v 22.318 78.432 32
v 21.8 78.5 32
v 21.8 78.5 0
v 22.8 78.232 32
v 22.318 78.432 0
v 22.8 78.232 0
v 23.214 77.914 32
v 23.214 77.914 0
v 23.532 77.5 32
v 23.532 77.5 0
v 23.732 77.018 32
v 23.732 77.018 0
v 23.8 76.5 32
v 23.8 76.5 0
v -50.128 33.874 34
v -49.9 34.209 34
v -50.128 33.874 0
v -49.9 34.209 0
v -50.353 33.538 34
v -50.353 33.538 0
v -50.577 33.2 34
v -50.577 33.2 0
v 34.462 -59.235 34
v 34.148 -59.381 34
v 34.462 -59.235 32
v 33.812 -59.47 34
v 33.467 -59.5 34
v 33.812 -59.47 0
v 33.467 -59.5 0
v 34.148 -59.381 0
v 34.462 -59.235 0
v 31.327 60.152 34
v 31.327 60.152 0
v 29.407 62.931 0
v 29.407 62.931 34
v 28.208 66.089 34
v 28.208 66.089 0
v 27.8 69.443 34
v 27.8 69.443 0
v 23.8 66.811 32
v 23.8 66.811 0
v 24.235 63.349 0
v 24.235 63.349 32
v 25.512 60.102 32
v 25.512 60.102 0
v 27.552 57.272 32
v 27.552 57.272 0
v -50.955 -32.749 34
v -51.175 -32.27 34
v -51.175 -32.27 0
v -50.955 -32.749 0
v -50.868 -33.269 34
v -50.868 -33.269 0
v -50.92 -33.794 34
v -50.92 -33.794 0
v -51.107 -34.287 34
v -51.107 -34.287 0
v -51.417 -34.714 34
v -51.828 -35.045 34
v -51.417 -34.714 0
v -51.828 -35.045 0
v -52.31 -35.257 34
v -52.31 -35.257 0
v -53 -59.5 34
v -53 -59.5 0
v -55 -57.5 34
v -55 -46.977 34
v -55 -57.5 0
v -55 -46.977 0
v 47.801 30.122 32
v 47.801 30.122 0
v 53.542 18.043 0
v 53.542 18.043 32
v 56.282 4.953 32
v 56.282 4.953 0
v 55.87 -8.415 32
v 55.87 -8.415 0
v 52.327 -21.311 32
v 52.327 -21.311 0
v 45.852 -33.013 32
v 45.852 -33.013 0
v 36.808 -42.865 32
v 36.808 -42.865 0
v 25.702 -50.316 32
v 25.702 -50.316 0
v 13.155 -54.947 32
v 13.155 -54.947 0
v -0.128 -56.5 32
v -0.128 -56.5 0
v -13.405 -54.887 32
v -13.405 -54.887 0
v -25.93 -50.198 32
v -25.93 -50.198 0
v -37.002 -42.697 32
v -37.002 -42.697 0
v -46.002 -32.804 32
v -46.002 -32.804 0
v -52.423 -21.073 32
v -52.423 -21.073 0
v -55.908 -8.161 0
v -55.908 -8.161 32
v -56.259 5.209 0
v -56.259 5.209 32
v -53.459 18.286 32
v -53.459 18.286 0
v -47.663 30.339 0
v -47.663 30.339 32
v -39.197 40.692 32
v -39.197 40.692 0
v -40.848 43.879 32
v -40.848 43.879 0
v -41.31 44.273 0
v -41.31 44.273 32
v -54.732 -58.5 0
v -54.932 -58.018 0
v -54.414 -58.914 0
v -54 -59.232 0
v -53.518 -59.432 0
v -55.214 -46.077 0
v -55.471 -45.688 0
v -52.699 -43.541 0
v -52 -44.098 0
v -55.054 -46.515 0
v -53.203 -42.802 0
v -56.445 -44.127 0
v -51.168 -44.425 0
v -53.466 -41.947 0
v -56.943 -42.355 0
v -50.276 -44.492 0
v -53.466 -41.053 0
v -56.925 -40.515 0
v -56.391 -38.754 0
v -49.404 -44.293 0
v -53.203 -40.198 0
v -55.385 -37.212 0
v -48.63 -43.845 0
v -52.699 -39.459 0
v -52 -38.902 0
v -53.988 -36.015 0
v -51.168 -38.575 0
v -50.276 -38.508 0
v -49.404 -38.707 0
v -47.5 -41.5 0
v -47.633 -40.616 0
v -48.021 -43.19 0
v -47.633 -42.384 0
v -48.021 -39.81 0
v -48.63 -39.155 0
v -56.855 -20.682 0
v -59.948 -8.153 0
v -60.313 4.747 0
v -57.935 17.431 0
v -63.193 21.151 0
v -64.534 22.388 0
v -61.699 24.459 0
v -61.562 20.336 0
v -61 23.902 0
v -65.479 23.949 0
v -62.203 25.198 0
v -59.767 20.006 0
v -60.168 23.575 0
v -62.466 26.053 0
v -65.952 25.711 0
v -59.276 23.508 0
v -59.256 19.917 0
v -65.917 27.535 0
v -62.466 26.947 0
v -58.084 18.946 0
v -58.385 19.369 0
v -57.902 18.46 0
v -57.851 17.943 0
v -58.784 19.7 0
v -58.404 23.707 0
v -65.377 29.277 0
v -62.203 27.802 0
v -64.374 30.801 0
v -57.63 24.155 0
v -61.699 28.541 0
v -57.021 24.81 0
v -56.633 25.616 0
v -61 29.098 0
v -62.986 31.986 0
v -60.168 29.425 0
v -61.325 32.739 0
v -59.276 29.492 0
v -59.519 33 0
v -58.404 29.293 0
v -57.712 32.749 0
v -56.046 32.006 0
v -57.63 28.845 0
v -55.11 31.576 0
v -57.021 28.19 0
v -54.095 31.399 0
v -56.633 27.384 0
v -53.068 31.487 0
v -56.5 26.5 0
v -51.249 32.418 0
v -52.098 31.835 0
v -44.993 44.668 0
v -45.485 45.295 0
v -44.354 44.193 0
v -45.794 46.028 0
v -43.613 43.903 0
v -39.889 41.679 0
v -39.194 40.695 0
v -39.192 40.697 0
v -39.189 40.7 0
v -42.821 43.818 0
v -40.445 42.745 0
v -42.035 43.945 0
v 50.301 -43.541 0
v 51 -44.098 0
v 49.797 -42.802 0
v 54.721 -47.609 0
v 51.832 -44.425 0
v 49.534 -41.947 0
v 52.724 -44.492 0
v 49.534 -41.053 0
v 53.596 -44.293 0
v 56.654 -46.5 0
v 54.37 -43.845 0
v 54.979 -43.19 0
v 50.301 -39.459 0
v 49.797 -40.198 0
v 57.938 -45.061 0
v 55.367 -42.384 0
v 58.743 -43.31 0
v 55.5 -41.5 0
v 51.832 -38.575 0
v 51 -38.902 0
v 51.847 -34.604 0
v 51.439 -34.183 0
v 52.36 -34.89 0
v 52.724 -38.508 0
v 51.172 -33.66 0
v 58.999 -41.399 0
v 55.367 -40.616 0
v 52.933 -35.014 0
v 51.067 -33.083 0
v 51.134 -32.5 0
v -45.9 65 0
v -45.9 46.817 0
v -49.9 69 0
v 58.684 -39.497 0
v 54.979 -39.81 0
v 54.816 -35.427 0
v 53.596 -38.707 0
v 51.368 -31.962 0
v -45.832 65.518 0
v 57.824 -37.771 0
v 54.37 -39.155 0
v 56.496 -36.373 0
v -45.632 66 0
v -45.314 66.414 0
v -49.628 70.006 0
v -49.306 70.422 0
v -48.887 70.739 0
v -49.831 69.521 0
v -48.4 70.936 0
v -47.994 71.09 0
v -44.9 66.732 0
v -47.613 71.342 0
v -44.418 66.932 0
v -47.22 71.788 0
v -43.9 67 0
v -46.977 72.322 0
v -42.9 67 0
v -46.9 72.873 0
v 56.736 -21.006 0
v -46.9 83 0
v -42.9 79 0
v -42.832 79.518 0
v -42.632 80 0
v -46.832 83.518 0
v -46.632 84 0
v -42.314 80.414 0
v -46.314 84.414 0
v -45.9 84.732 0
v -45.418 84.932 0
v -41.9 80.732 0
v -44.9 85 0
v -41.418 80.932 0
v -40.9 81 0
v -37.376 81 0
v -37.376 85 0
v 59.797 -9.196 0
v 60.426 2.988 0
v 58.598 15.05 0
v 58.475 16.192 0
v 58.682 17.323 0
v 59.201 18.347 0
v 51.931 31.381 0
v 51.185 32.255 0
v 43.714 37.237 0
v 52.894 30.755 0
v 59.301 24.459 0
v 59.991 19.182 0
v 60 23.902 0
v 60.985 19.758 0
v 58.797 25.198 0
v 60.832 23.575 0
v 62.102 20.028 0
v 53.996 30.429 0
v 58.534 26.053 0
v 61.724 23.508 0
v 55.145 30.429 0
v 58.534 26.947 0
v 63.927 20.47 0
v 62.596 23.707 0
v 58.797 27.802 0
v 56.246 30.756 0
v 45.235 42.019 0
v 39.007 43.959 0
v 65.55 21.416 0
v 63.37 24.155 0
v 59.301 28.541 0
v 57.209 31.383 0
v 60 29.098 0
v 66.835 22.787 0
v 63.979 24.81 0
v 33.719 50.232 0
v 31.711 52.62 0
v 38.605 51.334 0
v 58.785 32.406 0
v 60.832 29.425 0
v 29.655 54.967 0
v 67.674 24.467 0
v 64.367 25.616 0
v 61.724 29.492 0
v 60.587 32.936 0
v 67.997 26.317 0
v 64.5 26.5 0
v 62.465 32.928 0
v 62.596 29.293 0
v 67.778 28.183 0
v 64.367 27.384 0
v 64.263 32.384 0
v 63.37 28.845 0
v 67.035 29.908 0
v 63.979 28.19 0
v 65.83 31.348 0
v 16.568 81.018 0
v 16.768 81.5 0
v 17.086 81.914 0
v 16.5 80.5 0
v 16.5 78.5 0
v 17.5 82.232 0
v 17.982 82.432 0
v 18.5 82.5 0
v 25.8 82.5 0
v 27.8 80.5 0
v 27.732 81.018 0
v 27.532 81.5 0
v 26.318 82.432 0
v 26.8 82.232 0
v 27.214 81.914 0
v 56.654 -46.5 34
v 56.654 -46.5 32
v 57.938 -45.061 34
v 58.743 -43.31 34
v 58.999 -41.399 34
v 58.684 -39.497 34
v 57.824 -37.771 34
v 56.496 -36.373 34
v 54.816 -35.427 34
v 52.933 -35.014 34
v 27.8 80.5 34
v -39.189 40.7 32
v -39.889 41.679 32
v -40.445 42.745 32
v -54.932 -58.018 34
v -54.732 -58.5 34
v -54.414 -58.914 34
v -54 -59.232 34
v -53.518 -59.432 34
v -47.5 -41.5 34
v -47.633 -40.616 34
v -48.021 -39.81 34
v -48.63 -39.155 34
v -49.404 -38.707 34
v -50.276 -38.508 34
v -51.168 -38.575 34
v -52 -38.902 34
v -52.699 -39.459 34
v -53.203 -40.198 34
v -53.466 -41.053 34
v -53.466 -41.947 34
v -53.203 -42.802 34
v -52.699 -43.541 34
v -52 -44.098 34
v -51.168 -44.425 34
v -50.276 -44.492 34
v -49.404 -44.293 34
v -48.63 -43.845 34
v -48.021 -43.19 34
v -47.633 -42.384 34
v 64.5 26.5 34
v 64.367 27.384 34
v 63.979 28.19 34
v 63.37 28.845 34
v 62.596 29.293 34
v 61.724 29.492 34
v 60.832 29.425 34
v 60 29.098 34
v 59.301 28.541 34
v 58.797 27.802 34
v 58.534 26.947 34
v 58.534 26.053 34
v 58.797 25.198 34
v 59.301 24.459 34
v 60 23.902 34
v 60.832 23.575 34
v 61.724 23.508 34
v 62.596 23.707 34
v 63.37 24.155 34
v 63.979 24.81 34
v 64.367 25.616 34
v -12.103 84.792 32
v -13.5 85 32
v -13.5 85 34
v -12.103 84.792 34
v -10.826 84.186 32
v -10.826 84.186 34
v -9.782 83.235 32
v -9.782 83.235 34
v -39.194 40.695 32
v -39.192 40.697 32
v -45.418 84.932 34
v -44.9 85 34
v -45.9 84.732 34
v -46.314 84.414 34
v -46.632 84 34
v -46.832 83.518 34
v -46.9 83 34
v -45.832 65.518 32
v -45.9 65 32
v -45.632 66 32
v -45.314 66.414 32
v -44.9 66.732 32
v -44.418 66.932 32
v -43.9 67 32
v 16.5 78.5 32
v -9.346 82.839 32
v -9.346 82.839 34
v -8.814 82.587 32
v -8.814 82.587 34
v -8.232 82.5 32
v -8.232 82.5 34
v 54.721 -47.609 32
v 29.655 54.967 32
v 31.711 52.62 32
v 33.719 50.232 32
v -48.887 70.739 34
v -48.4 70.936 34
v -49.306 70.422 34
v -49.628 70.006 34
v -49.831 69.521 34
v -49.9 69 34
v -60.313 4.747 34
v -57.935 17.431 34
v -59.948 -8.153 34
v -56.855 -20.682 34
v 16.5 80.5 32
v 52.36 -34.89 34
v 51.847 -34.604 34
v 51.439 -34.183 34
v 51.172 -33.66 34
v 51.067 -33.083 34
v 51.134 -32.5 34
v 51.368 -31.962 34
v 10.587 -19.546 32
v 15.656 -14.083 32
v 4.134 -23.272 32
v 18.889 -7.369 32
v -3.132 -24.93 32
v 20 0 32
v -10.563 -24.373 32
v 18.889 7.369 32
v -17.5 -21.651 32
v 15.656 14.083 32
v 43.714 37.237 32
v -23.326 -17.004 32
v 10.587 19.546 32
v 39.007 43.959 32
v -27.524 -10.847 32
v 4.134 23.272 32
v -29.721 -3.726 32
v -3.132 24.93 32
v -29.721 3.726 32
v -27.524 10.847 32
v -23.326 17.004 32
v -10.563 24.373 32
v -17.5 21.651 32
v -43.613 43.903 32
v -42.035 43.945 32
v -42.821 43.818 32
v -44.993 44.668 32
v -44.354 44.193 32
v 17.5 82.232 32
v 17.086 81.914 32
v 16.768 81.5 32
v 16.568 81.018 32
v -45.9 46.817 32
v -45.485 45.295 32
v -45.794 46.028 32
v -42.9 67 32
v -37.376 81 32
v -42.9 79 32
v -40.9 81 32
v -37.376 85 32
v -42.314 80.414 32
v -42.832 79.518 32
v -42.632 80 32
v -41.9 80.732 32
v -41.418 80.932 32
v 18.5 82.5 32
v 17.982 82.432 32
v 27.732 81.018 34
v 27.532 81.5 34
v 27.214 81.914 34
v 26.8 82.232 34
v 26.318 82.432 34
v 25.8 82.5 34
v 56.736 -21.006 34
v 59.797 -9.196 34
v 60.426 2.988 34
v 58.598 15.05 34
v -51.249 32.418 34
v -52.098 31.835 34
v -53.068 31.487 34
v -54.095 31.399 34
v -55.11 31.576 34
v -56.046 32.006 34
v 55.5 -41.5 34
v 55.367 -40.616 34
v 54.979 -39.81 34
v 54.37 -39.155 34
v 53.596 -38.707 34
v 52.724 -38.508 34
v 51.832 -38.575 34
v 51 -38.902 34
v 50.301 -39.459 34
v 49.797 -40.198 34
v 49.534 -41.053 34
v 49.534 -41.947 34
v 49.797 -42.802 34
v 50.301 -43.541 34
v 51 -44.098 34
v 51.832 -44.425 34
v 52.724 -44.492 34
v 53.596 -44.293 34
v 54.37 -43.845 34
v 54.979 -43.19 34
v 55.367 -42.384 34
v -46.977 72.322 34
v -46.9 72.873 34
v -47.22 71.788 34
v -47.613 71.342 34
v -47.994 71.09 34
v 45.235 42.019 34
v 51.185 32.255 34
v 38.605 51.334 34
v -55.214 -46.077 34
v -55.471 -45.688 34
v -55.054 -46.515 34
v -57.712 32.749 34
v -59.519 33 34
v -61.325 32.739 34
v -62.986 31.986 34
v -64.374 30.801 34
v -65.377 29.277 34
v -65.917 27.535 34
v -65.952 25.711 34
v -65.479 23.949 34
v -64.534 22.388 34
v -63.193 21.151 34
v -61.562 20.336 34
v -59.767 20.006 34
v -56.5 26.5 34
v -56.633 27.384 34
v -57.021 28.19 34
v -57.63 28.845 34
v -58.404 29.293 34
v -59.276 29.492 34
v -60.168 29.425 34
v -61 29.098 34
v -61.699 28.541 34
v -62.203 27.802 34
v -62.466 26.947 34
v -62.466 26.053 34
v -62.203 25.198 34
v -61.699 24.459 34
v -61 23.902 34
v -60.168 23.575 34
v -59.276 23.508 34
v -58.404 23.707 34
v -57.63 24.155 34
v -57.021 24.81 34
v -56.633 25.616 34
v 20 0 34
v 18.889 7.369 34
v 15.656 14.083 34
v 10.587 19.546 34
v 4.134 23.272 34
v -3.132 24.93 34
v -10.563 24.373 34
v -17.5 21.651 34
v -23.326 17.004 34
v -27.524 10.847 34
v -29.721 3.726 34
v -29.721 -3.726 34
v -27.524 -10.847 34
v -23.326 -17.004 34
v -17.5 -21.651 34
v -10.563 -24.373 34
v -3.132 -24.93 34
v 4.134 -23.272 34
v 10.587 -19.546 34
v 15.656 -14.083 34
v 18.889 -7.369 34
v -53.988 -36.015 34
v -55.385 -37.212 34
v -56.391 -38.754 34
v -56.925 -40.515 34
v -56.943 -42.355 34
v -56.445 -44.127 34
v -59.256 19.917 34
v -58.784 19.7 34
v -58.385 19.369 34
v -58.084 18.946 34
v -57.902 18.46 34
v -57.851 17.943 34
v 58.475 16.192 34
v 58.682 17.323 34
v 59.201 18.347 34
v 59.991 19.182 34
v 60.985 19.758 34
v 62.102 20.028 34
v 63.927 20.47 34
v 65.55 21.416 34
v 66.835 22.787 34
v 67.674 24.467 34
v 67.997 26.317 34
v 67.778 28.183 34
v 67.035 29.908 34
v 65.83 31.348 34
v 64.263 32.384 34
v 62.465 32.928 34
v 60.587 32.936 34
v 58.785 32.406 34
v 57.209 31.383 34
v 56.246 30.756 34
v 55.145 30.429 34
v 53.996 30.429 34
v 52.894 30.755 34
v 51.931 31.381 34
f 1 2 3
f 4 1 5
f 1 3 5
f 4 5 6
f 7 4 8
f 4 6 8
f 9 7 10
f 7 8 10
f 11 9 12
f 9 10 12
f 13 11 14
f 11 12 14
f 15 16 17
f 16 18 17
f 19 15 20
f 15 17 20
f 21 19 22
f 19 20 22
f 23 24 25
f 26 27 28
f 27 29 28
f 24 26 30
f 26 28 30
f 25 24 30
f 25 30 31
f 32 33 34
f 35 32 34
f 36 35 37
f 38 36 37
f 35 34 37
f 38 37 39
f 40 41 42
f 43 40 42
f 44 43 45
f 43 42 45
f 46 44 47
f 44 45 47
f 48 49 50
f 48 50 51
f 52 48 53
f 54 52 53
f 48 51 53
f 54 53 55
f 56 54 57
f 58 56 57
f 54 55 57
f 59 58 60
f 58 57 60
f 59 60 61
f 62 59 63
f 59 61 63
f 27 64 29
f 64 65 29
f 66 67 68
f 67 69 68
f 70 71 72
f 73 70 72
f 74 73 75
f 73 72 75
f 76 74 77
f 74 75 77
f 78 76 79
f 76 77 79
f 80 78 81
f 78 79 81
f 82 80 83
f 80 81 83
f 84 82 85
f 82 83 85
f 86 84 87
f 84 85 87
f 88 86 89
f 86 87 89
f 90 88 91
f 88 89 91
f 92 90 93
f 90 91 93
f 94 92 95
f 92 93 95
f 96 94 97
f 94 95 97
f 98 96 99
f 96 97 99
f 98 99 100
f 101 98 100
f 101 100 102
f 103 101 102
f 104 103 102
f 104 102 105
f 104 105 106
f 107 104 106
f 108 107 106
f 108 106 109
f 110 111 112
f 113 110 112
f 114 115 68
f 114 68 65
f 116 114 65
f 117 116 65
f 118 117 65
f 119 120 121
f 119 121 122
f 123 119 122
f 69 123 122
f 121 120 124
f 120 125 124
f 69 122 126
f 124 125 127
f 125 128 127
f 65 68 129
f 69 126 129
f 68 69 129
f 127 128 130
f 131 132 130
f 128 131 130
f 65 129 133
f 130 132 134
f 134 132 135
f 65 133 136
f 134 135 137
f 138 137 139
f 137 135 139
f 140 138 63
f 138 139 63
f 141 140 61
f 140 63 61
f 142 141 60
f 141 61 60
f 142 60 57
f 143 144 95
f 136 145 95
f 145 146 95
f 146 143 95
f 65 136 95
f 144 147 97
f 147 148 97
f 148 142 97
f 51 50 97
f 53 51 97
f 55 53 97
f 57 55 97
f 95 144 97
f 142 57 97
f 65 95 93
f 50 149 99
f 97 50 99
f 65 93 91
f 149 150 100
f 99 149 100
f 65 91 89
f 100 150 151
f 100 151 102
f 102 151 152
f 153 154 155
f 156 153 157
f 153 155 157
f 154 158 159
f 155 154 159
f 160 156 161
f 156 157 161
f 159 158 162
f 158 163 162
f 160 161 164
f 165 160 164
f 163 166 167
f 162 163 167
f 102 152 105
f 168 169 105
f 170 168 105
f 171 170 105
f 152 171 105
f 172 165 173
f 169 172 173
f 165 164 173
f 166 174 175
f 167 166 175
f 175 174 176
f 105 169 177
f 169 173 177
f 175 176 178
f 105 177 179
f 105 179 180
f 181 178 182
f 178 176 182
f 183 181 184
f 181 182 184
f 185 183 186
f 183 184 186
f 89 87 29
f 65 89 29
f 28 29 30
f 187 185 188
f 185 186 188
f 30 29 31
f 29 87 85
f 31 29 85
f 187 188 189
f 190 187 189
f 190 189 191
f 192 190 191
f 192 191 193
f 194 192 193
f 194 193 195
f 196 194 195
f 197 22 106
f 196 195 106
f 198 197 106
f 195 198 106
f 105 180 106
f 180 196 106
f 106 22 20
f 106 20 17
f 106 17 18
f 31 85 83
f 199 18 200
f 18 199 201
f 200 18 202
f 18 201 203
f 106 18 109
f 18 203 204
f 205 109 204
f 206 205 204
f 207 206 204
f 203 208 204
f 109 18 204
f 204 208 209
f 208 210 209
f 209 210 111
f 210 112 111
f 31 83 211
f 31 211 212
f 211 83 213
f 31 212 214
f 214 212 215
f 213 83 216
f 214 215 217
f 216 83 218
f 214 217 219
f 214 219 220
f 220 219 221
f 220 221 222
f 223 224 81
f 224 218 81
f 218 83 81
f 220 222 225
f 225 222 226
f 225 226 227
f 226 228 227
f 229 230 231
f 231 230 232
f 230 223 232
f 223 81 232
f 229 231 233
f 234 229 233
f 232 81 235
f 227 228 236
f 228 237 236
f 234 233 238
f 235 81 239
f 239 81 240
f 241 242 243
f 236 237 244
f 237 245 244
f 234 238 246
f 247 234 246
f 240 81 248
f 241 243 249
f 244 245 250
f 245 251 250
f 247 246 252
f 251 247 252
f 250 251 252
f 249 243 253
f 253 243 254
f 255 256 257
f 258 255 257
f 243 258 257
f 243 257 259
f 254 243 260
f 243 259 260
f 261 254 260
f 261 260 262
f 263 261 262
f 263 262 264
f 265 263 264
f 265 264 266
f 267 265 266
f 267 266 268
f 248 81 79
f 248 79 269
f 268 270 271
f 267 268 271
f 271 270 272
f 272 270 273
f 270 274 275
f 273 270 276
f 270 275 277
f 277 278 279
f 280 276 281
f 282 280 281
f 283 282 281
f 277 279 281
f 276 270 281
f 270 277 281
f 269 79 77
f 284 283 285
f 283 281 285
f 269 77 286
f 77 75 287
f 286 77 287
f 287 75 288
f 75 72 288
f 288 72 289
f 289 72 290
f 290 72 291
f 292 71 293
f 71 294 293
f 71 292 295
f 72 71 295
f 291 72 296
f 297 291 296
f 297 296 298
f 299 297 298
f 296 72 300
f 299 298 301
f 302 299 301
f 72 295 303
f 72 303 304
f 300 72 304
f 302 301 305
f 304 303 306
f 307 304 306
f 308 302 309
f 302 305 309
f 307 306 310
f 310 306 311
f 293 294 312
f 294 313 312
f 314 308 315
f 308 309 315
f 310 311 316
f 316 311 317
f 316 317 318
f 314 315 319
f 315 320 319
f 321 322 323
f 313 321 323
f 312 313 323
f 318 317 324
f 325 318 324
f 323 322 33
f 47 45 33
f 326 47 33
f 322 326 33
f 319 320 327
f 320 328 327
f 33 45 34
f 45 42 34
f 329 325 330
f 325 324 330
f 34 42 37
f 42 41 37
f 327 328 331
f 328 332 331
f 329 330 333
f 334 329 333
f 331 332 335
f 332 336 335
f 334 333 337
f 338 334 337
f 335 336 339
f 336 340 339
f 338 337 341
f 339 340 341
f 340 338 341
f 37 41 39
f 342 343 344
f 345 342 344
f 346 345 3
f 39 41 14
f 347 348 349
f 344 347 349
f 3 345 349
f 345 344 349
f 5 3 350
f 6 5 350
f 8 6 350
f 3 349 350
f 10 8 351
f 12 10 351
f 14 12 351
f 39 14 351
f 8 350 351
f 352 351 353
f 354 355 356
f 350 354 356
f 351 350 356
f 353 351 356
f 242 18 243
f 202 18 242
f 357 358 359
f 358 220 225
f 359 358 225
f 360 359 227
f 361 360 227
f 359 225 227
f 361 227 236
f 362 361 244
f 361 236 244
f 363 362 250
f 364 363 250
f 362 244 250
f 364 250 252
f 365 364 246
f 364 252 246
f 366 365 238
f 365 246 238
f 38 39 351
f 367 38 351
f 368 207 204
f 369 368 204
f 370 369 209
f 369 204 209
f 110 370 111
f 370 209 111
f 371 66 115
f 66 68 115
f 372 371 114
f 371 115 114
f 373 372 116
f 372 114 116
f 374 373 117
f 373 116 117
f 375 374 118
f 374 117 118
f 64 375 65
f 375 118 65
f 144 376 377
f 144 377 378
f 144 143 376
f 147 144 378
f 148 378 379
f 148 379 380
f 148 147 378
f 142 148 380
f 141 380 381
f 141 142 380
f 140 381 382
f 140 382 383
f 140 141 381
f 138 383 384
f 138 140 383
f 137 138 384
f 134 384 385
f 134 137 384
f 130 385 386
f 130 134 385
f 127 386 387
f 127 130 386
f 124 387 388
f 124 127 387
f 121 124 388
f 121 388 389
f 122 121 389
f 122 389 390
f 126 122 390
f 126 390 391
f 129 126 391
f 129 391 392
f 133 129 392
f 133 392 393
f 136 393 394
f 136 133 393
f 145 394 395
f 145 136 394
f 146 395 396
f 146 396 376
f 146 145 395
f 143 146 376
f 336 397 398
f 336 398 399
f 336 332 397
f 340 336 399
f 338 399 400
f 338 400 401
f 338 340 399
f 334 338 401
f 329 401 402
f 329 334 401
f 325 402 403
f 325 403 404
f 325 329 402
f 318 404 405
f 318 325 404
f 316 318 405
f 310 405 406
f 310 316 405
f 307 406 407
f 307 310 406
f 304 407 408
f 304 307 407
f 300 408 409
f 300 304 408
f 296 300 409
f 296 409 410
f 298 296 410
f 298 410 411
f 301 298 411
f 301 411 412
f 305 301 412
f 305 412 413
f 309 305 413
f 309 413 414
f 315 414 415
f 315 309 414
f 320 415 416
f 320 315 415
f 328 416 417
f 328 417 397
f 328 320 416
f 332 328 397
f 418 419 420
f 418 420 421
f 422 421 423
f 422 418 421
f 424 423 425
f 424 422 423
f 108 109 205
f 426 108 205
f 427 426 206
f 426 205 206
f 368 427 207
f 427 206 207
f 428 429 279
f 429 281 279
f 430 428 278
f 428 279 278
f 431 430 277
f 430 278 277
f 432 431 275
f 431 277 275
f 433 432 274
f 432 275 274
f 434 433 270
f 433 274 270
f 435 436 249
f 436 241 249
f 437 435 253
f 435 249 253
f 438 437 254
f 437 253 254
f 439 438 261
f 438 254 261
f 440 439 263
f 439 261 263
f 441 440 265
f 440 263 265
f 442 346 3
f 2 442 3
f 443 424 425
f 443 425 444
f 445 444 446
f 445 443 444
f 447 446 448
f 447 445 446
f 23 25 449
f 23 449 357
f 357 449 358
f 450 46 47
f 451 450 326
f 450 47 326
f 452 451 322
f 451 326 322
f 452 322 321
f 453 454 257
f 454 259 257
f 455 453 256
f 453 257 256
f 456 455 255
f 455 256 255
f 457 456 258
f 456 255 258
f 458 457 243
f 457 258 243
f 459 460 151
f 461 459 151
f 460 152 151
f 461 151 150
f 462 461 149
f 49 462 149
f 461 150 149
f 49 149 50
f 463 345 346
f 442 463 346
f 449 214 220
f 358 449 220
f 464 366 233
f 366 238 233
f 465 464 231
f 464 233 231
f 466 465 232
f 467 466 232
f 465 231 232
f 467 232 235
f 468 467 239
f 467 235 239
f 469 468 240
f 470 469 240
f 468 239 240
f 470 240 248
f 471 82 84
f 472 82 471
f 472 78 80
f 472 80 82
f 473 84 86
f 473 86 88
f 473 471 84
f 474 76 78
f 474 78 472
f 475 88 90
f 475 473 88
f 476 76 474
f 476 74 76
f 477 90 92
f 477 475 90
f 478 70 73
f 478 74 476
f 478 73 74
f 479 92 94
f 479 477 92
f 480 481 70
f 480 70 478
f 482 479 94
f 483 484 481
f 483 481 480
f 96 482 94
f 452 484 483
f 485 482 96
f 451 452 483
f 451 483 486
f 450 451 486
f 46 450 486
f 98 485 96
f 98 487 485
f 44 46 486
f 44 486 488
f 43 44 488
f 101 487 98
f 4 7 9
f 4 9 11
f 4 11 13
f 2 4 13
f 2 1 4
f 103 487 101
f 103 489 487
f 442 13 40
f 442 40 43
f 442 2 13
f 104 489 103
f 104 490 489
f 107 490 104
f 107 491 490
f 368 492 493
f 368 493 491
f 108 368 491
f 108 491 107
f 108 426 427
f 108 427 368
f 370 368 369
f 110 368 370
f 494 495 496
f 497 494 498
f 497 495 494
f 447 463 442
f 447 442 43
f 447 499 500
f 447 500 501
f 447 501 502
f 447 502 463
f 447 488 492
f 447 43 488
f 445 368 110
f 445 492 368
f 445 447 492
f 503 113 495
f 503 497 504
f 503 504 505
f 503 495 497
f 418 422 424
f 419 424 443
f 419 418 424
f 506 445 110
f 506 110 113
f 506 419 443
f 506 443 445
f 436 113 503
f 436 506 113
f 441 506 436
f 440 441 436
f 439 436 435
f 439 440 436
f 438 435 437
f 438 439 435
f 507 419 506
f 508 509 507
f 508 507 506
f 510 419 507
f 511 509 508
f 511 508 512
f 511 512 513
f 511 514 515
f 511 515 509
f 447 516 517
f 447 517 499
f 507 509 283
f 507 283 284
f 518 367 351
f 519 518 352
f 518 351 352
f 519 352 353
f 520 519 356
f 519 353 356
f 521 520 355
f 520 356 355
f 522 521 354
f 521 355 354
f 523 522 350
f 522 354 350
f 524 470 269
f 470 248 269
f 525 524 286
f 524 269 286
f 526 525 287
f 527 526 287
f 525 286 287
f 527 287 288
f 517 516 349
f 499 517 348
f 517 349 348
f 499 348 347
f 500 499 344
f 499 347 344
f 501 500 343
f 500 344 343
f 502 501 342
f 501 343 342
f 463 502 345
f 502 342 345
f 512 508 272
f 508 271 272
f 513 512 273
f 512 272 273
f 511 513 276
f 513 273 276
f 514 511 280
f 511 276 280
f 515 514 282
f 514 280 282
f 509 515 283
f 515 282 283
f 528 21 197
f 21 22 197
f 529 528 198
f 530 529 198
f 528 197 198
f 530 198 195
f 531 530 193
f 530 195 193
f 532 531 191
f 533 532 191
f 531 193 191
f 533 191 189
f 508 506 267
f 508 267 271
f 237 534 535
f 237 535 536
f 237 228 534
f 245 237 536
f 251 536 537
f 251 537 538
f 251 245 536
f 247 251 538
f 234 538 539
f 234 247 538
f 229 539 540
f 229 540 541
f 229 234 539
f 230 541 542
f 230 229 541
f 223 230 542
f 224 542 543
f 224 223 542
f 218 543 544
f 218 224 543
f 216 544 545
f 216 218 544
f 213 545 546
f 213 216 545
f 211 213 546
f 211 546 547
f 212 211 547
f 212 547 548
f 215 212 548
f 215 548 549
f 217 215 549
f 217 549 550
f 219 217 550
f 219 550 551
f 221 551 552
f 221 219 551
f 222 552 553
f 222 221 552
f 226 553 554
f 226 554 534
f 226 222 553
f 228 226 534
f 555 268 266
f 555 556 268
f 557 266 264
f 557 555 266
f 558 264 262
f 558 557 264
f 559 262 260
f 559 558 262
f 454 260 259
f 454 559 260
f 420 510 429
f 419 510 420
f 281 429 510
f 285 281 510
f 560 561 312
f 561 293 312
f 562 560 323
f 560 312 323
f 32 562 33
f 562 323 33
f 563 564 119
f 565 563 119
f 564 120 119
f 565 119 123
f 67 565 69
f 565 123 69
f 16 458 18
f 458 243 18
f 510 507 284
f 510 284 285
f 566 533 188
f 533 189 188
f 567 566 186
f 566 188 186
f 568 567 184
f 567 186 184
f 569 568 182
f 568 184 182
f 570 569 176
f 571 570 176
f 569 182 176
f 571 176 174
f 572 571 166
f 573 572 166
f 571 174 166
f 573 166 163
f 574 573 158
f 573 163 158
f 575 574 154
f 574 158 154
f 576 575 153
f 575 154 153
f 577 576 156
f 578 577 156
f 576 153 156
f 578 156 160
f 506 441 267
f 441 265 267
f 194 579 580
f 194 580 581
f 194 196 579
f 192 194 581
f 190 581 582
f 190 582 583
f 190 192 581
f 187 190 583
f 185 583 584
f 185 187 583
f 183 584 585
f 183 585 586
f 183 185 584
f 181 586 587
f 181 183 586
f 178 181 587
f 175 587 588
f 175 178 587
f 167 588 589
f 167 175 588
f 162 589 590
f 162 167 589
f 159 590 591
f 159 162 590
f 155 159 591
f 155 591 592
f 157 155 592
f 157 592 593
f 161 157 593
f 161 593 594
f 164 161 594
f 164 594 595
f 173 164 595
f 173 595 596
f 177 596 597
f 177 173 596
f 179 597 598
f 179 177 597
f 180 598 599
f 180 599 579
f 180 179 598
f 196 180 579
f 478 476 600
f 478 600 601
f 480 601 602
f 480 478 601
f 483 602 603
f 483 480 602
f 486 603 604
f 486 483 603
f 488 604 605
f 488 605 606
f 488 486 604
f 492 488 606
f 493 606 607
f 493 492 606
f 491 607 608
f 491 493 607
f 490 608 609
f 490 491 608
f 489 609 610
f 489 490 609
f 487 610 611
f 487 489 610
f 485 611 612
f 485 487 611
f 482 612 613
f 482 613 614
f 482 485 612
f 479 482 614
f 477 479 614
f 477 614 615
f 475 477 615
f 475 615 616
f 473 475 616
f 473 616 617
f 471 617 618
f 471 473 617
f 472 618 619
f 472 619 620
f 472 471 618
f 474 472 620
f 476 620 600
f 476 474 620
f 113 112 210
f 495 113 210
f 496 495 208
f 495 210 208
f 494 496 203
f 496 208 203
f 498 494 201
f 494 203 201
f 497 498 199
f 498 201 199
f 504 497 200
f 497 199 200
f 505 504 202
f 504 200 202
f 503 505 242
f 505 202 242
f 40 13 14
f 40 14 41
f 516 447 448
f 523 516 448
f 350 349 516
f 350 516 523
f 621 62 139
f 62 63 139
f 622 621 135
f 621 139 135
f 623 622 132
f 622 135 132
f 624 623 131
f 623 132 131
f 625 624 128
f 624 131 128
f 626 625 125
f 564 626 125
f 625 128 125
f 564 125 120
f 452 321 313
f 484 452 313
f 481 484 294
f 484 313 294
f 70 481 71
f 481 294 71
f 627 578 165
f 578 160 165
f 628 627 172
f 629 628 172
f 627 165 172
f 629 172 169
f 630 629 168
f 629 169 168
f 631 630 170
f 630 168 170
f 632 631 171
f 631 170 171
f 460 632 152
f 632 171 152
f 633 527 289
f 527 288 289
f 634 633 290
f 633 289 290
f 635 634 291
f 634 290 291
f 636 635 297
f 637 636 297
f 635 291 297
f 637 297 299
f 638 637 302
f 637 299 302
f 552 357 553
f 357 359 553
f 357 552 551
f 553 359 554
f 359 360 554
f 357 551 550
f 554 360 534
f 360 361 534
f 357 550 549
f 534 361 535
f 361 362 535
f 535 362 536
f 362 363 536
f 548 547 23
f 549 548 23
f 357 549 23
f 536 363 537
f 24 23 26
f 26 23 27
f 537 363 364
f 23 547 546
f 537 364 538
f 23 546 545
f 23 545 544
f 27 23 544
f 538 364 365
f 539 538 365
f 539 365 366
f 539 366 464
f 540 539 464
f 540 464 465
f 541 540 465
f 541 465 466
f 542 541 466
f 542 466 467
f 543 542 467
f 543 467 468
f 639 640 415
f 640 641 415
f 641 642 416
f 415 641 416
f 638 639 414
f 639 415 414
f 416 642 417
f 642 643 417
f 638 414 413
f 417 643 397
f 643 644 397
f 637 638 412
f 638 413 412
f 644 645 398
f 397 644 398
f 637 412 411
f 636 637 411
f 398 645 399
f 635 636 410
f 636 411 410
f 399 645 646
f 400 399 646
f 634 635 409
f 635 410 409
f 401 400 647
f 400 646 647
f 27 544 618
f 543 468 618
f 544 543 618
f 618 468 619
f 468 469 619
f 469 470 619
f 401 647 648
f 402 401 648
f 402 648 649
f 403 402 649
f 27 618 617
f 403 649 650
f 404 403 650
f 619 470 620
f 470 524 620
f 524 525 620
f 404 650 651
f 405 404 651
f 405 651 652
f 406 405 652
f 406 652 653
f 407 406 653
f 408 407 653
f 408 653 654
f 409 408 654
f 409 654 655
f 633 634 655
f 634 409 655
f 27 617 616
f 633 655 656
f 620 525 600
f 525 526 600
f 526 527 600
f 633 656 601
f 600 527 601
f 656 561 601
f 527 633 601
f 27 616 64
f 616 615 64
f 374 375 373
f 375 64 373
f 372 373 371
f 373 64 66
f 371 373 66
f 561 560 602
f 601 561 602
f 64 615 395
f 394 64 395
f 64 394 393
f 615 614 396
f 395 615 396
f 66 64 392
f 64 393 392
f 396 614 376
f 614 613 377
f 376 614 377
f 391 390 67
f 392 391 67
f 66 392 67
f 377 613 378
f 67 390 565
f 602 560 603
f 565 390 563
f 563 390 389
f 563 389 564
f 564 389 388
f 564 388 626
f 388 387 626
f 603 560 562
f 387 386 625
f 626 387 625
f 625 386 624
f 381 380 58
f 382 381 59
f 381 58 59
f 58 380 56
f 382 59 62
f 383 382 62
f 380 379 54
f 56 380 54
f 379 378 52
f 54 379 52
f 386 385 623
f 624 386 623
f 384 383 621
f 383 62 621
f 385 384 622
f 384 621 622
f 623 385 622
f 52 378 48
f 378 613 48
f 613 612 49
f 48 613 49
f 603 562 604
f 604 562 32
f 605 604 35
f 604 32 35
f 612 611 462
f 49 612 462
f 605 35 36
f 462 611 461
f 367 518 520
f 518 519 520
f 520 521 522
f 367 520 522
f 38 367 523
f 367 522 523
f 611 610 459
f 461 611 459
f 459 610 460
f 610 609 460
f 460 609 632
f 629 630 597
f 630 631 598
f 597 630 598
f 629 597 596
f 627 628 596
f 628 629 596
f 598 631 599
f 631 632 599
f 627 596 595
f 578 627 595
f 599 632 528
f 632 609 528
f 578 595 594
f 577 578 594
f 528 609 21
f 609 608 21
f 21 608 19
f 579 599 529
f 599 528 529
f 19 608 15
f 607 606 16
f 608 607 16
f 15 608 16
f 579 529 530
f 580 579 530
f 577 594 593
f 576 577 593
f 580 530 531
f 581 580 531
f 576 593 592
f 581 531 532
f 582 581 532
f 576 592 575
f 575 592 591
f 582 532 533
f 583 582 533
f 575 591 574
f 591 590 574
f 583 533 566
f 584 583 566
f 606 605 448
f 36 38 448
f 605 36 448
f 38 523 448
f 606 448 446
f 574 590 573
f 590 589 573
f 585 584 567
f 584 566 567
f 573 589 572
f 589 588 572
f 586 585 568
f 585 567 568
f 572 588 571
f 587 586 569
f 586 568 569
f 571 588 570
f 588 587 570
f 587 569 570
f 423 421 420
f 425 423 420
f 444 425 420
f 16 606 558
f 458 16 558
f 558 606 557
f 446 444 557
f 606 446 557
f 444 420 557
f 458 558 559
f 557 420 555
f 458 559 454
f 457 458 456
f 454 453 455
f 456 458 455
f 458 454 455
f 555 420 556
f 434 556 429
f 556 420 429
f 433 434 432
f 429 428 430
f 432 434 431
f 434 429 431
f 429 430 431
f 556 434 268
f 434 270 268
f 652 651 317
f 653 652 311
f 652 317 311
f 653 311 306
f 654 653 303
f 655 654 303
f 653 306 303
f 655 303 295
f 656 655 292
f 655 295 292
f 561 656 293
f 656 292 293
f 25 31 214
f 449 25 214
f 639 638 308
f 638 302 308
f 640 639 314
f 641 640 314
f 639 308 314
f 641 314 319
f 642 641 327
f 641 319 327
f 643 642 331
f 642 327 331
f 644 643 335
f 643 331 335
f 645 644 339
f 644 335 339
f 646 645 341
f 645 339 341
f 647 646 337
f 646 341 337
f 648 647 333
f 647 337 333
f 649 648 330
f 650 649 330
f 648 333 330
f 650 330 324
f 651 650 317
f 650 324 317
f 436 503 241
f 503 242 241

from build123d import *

# Parameters (mm, degrees)
SKETCH1_R           = 3
BOSS_EXTRUDE1_DEPTH = 32
SKETCH2_R           = 25
SKETCH2_R_2         = 3
BOSS_EXTRUDE2_DEPTH = 2
CUT_EXTRUDE3_START  = -43.5
CUT_EXTRUDE3_DEPTH  = 43.5
BOSS_EXTRUDE3_START = -2
BOSS_EXTRUDE3_DEPTH = 2
FILLET3_R           = 2


with BuildPart() as part:
    # Sketch1 → Boss-Extrude1 (new body)
    with BuildSketch(Plane.XY):
        with BuildLine():
            Line((-53, -59.5), (-5, -59.5))
            Line((-5, -59.5), (33.466899887, -59.5))
            ThreePointArc((33.466899887, -59.5), (33.982014794, -59.432525972), (34.462372823, -59.234656633))
            Line((34.462372823, -59.234656633), (54.72098291, -47.608783423))
            Line((54.72098291, -47.608783423), (56.653811778, -46.499584754))
            ThreePointArc((56.653811778, -46.499584754), (58.683573084, -39.496646832), (52.932852386, -35.014428413))
            ThreePointArc((52.932852386, -35.014428413), (51.286335437, -33.93136983), (51.367924528, -31.962264151))
            ThreePointArc((51.367924528, -31.962264151), (59.796951453, -9.196444799), (58.598166416, 15.05007949))
            ThreePointArc((58.598166416, 15.05007949), (59.201470515, 18.347484522), (62.101977599, 20.027935185))
            ThreePointArc((62.101977599, 20.027935185), (67.46941068, 29.07218509), (57.209308895, 31.382619158))
            ThreePointArc((57.209308895, 31.382619158), (53.995797744, 30.428574159), (51.184766788, 32.254761647))
            ThreePointArc((51.184766788, 32.254761647), (42.003181209, 46.735407793), (31.327057509, 60.152225945))
            ThreePointArc((31.327057509, 60.152225945), (28.711432567, 64.474102627), (27.8, 69.442945809))
            Line((27.8, 69.442945809), (27.8, 80.5))
            ThreePointArc((27.8, 80.5), (27.214213562, 81.914213562), (25.8, 82.5))
            Line((25.8, 82.5), (18.5, 82.5))
            ThreePointArc((18.5, 82.5), (17.085786438, 81.914213562), (16.5, 80.5))
            Line((16.5, 80.5), (16.5, 78.5))
            Line((16.5, 78.5), (21.8, 78.5))
            ThreePointArc((21.8, 78.5), (23.214213562, 77.914213562), (23.8, 76.5))
            Line((23.8, 76.5), (23.8, 66.810649809))
            ThreePointArc((23.8, 66.810649809), (24.771773344, 61.685680521), (27.552187173, 57.272183881))
            ThreePointArc((27.552187173, 57.272183881), (30.688635385, 53.798817753), (33.71882223, 50.232370314))
            ThreePointArc((33.71882223, 50.232370314), (41.435950887, 40.650801907), (47.800649975, 30.122215422))
            ThreePointArc((47.800649975, 30.122215422), (-6.814518891, -56.087541685), (-39.196843269, 40.692228715))
            ThreePointArc((-39.196843269, 40.692228715), (-37.08221818, 41.75647487), (-34.736286869, 41.438881683))
            ThreePointArc((-34.736286869, 41.438881683), (-27.633151067, 48.108450504), (-37.376275293, 48.204454676))
            ThreePointArc((-37.376275293, 48.204454676), (-37.855586541, 47.355396867), (-38.526075168, 46.647524395))
            ThreePointArc((-38.526075168, 46.647524395), (-39.712733241, 45.641525156), (-40.87313288, 44.605347309))
            ThreePointArc((-40.87313288, 44.605347309), (-44.108142168, 44.071249287), (-45.899899799, 46.817182713))
            Line((-45.899899799, 46.817182713), (-45.899899799, 65))
            ThreePointArc((-45.899899799, 65), (-45.314113362, 66.414213562), (-43.899899799, 67))
            Line((-43.899899799, 67), (-42.899899799, 67))
            Line((-42.899899799, 67), (-42.899899799, 79))
            ThreePointArc((-42.899899799, 79), (-42.314113362, 80.414213562), (-40.899899799, 81))
            Line((-40.899899799, 81), (-20.193280212, 81))
            ThreePointArc((-20.193280212, 81), (-18.909902316, 80.533929978), (-18.224668385, 79.352941176))
            ThreePointArc((-18.224668385, 79.352941176), (-14.448760929, 75.49469951), (-9.472757132, 77.588235294))
            ThreePointArc((-9.472757132, 77.588235294), (-8.74960298, 78.257337558), (-7.79473927, 78.5))
            Line((-7.79473927, 78.5), (-5, 78.5))
            Line((-5, 78.5), (-3.5, 78.5))
            Line((-3.5, 78.5), (-3.5, 82.5))
            Line((-3.5, 82.5), (-5, 82.5))
            Line((-5, 82.5), (-8.232173124, 82.5))
            ThreePointArc((-8.232173124, 82.5), (-9.089666049, 82.693150288), (-9.78153397, 83.235294118))
            ThreePointArc((-9.78153397, 83.235294118), (-11.442016978, 84.536439309), (-13.5, 85))
            Line((-13.5, 85), (-44.899899799, 85))
            ThreePointArc((-44.899899799, 85), (-46.314113362, 84.414213562), (-46.899899799, 83))
            Line((-46.899899799, 83), (-46.899899799, 71))
            Line((-46.899899799, 71), (-47.899899799, 71))
            ThreePointArc((-47.899899799, 71), (-49.314113362, 70.414213562), (-49.899899799, 69))
            Line((-49.899899799, 69), (-49.899899799, 34.208916966))
            ThreePointArc((-49.899899799, 34.208916966), (-50.240874628, 33.706149537), (-50.576784, 33.199983739))
            ThreePointArc((-50.576784, 33.199983739), (-53.06788243, 31.486994298), (-56.046149849, 32.00644342))
            ThreePointArc((-56.046149849, 32.00644342), (-65.708375749, 28.425115726), (-59.767444663, 20.00550438))
            ThreePointArc((-59.767444663, 20.00550438), (-58.220458323, 19.167136154), (-57.934543798, 17.430967699))
            ThreePointArc((-57.934543798, 17.430967699), (-59.948169649, -8.152726891), (-51.175463245, -32.26952063))
            ThreePointArc((-51.175463245, -32.26952063), (-50.997534258, -34.046420575), (-52.310222544, -35.25715655))
            ThreePointArc((-52.310222544, -35.25715655), (-56.720764111, -39.615300058), (-55.470588235, -45.688466616))
            ThreePointArc((-55.470588235, -45.688466616), (-55.121327127, -46.291231234), (-55, -46.977225575))
            Line((-55, -46.977225575), (-55, -57.5))
            ThreePointArc((-55, -57.5), (-54.414213562, -58.914213562), (-53, -59.5))
        make_face()
        with Locations((-50.5, -41.5)):
            Circle(SKETCH1_R, mode=Mode.SUBTRACT)
        with Locations((52.5, -41.5)):
            Circle(SKETCH1_R, mode=Mode.SUBTRACT)
        with Locations((-59.5, 26.5)):
            Circle(SKETCH1_R, mode=Mode.SUBTRACT)
        with Locations((-32.523991145, 46.2)):
            Circle(SKETCH1_R, mode=Mode.SUBTRACT)
        with Locations((-13.5, 80.2)):
            Circle(SKETCH1_R, mode=Mode.SUBTRACT)
        with Locations((61.5, 26.5)):
            Circle(SKETCH1_R, mode=Mode.SUBTRACT)
    extrude(amount=BOSS_EXTRUDE1_DEPTH)

    # Sketch2 → Boss-Extrude2 (add)
    # profile 1 of 2: a face of its own
    with BuildSketch(Plane.XY.offset(32)):
        with BuildLine():
            Line((18.5, 82.5), (-3.5, 82.5))
            Line((-3.5, 82.5), (-3.5, 78.5))
            Line((-3.5, 78.5), (-7.79473927, 78.5))
            ThreePointArc((-7.79473927, 78.5), (-8.74960298, 78.257337558), (-9.472757132, 77.588235294))
            ThreePointArc((-9.472757132, 77.588235294), (-14.448760929, 75.49469951), (-18.224668385, 79.352941176))
            ThreePointArc((-18.224668385, 79.352941176), (-18.909902316, 80.533929978), (-20.193280212, 81))
            Line((-20.193280212, 81), (-40.899899799, 81))
            ThreePointArc((-40.899899799, 81), (-42.314113362, 80.414213562), (-42.899899799, 79))
            Line((-42.899899799, 79), (-42.899899799, 67))
            Line((-42.899899799, 67), (-43.899899799, 67))
            ThreePointArc((-43.899899799, 67), (-45.314113362, 66.414213562), (-45.899899799, 65))
            Line((-45.899899799, 65), (-45.899899799, 46.817182713))
            ThreePointArc((-45.899899799, 46.817182713), (-44.108142168, 44.071249287), (-40.87313288, 44.605347309))
            ThreePointArc((-40.87313288, 44.605347309), (-39.712733241, 45.641525156), (-38.526075168, 46.647524395))
            ThreePointArc((-38.526075168, 46.647524395), (-37.855586541, 47.355396867), (-37.376275293, 48.204454676))
            ThreePointArc((-37.376275293, 48.204454676), (-27.633151067, 48.108450504), (-34.736286869, 41.438881683))
            ThreePointArc((-34.736286869, 41.438881683), (-37.08221818, 41.75647487), (-39.196843269, 40.692228715))
            ThreePointArc((-39.196843269, 40.692228715), (-6.814518891, -56.087541685), (47.800649975, 30.122215422))
            ThreePointArc((47.800649975, 30.122215422), (41.435950887, 40.650801907), (33.71882223, 50.232370314))
            ThreePointArc((33.71882223, 50.232370314), (30.688635385, 53.798817753), (27.552187173, 57.272183881))
            ThreePointArc((27.552187173, 57.272183881), (24.771773344, 61.685680521), (23.8, 66.810649809))
            Line((23.8, 66.810649809), (23.8, 76.5))
            ThreePointArc((23.8, 76.5), (23.214213562, 77.914213562), (21.8, 78.5))
            Line((21.8, 78.5), (16.5, 78.5))
            Line((16.5, 78.5), (16.5, 80.5))
            ThreePointArc((16.5, 80.5), (17.085786438, 81.914213562), (18.5, 82.5))
        make_face()
        with Locations((-5, 0)):
            Circle(SKETCH2_R, mode=Mode.SUBTRACT)
    # profile 2 of 2: a face of its own
    with BuildSketch(Plane.XY.offset(32)):
        with BuildLine():
            Line((-3.5, 78.5), (-3.5, 82.5))
            Line((-3.5, 82.5), (-8.232173124, 82.5))
            ThreePointArc((-8.232173124, 82.5), (-9.089666049, 82.693150288), (-9.78153397, 83.235294118))
            ThreePointArc((-9.78153397, 83.235294118), (-11.442016978, 84.536439309), (-13.5, 85))
            Line((-13.5, 85), (-44.899899799, 85))
            ThreePointArc((-44.899899799, 85), (-46.314113362, 84.414213562), (-46.899899799, 83))
            Line((-46.899899799, 83), (-46.899899799, 71))
            Line((-46.899899799, 71), (-47.899899799, 71))
            ThreePointArc((-47.899899799, 71), (-49.314113362, 70.414213562), (-49.899899799, 69))
            Line((-49.899899799, 69), (-49.899899799, 34.208916966))
            ThreePointArc((-49.899899799, 34.208916966), (-50.240874628, 33.706149537), (-50.576784, 33.199983739))
            ThreePointArc((-50.576784, 33.199983739), (-53.06788243, 31.486994298), (-56.046149849, 32.00644342))
            ThreePointArc((-56.046149849, 32.00644342), (-65.708375749, 28.425115726), (-59.767444663, 20.00550438))
            ThreePointArc((-59.767444663, 20.00550438), (-58.220458323, 19.167136154), (-57.934543798, 17.430967699))
            ThreePointArc((-57.934543798, 17.430967699), (-59.948169649, -8.152726891), (-51.175463245, -32.26952063))
            ThreePointArc((-51.175463245, -32.26952063), (-50.997534258, -34.046420575), (-52.310222544, -35.25715655))
            ThreePointArc((-52.310222544, -35.25715655), (-56.720764111, -39.615300058), (-55.470588235, -45.688466616))
            ThreePointArc((-55.470588235, -45.688466616), (-55.121327127, -46.291231234), (-55, -46.977225575))
            Line((-55, -46.977225575), (-55, -57.5))
            ThreePointArc((-55, -57.5), (-54.414213562, -58.914213562), (-53, -59.5))
            Line((-53, -59.5), (33.466899887, -59.5))
            ThreePointArc((33.466899887, -59.5), (33.982014794, -59.432525972), (34.462372823, -59.234656633))
            Line((34.462372823, -59.234656633), (56.653811778, -46.499584754))
            ThreePointArc((56.653811778, -46.499584754), (58.683573084, -39.496646832), (52.932852386, -35.014428413))
            ThreePointArc((52.932852386, -35.014428413), (51.286335437, -33.93136983), (51.367924528, -31.962264151))
            ThreePointArc((51.367924528, -31.962264151), (59.796951453, -9.196444799), (58.598166416, 15.05007949))
            ThreePointArc((58.598166416, 15.05007949), (59.201470515, 18.347484522), (62.101977599, 20.027935185))
            ThreePointArc((62.101977599, 20.027935185), (67.46941068, 29.07218509), (57.209308895, 31.382619158))
            ThreePointArc((57.209308895, 31.382619158), (53.995797744, 30.428574159), (51.184766788, 32.254761647))
            ThreePointArc((51.184766788, 32.254761647), (42.003181209, 46.735407793), (31.327057509, 60.152225945))
            ThreePointArc((31.327057509, 60.152225945), (28.711432567, 64.474102627), (27.8, 69.442945809))
            Line((27.8, 69.442945809), (27.8, 80.5))
            ThreePointArc((27.8, 80.5), (27.214213562, 81.914213562), (25.8, 82.5))
            Line((25.8, 82.5), (18.5, 82.5))
            ThreePointArc((18.5, 82.5), (17.085786438, 81.914213562), (16.5, 80.5))
            Line((16.5, 80.5), (16.5, 78.5))
            Line((16.5, 78.5), (21.8, 78.5))
            ThreePointArc((21.8, 78.5), (23.214213562, 77.914213562), (23.8, 76.5))
            Line((23.8, 76.5), (23.8, 66.810649809))
            ThreePointArc((23.8, 66.810649809), (24.771773344, 61.685680521), (27.552187173, 57.272183881))
            ThreePointArc((27.552187173, 57.272183881), (30.688635385, 53.798817753), (33.71882223, 50.232370314))
            ThreePointArc((33.71882223, 50.232370314), (41.435950887, 40.650801907), (47.800649975, 30.122215422))
            ThreePointArc((47.800649975, 30.122215422), (-6.814518891, -56.087541685), (-39.196843269, 40.692228715))
            ThreePointArc((-39.196843269, 40.692228715), (-37.08221818, 41.75647487), (-34.736286869, 41.438881683))
            ThreePointArc((-34.736286869, 41.438881683), (-27.633151067, 48.108450504), (-37.376275293, 48.204454676))
            ThreePointArc((-37.376275293, 48.204454676), (-37.855586541, 47.355396867), (-38.526075168, 46.647524395))
            ThreePointArc((-38.526075168, 46.647524395), (-39.712733241, 45.641525156), (-40.87313288, 44.605347309))
            ThreePointArc((-40.87313288, 44.605347309), (-44.108142168, 44.071249287), (-45.899899799, 46.817182713))
            Line((-45.899899799, 46.817182713), (-45.899899799, 65))
            ThreePointArc((-45.899899799, 65), (-45.314113362, 66.414213562), (-43.899899799, 67))
            Line((-43.899899799, 67), (-42.899899799, 67))
            Line((-42.899899799, 67), (-42.899899799, 79))
            ThreePointArc((-42.899899799, 79), (-42.314113362, 80.414213562), (-40.899899799, 81))
            Line((-40.899899799, 81), (-20.193280212, 81))
            ThreePointArc((-20.193280212, 81), (-18.909902316, 80.533929978), (-18.224668385, 79.352941176))
            ThreePointArc((-18.224668385, 79.352941176), (-14.448760929, 75.49469951), (-9.472757132, 77.588235294))
            ThreePointArc((-9.472757132, 77.588235294), (-8.74960298, 78.257337558), (-7.79473927, 78.5))
            Line((-7.79473927, 78.5), (-3.5, 78.5))
        make_face()
        with Locations((-50.5, -41.5)):
            Circle(SKETCH2_R_2, mode=Mode.SUBTRACT)
        with Locations((52.5, -41.5)):
            Circle(SKETCH2_R_2, mode=Mode.SUBTRACT)
        with Locations((-59.5, 26.5)):
            Circle(SKETCH2_R_2, mode=Mode.SUBTRACT)
        with Locations((-32.523991145, 46.2)):
            Circle(SKETCH2_R_2, mode=Mode.SUBTRACT)
        with Locations((-13.5, 80.2)):
            Circle(SKETCH2_R_2, mode=Mode.SUBTRACT)
        with Locations((61.5, 26.5)):
            Circle(SKETCH2_R_2, mode=Mode.SUBTRACT)
    extrude(amount=BOSS_EXTRUDE2_DEPTH)

    # Sketch3 → Cut-Extrude3 (cut)
    with BuildSketch(Plane.XY.offset(34).offset(CUT_EXTRUDE3_START)):
        with BuildLine():
            Line((-3.5, 82.5), (16.5, 82.5))
            Line((16.5, 82.5), (16.5, 46.481693385))
            ThreePointArc((16.5, 46.481693385), (15.627802553, 44.36687512), (13.518362469, 43.481749583))
            Line((13.518362469, 43.481749583), (-22.529300144, 43.261104089))
            ThreePointArc((-22.529300144, 43.261104089), (-24.003633635, 42.86343982), (-25.091226832, 41.791554962))
            ThreePointArc((-25.091226832, 41.791554962), (-33.658943745, 37.633071987), (-40.848269224, 43.879058931))
            Line((-40.848269224, 43.879058931), (-45.899899799, 48.190532346))
            Line((-45.899899799, 48.190532346), (-45.899899799, 65))
            ThreePointArc((-45.899899799, 65), (-45.314113362, 66.414213562), (-43.899899799, 67))
            Line((-43.899899799, 67), (-42.899899799, 67))
            Line((-42.899899799, 67), (-42.899899799, 79))
            ThreePointArc((-42.899899799, 79), (-42.314113362, 80.414213562), (-40.899899799, 81))
            Line((-40.899899799, 81), (-37.376275293, 81))
            Line((-37.376275293, 81), (-37.376275293, 85))
            Line((-37.376275293, 85), (-13.5, 85))
            ThreePointArc((-13.5, 85), (-11.442016978, 84.536439309), (-9.78153397, 83.235294118))
            ThreePointArc((-9.78153397, 83.235294118), (-9.089666049, 82.693150288), (-8.232173124, 82.5))
            Line((-8.232173124, 82.5), (-5, 82.5))
            Line((-5, 82.5), (-3.5, 82.5))
        make_face()
    extrude(amount=CUT_EXTRUDE3_DEPTH, mode=Mode.SUBTRACT)

    # Sketch5 → Boss-Extrude3 (add)
    with BuildSketch(Plane.XY.offset(34).offset(BOSS_EXTRUDE3_START)):
        with BuildLine():
            Line((-3.5, 82.5), (16.5, 82.5))
            Line((16.5, 82.5), (16.5, 46.481693385))
            ThreePointArc((16.5, 46.481693385), (15.627802553, 44.36687512), (13.518362469, 43.481749583))
            Line((13.518362469, 43.481749583), (-22.529300144, 43.261104089))
            ThreePointArc((-22.529300144, 43.261104089), (-24.003633635, 42.86343982), (-25.091226832, 41.791554962))
            ThreePointArc((-25.091226832, 41.791554962), (-33.658943745, 37.633071987), (-40.848269224, 43.879058931))
            Line((-40.848269224, 43.879058931), (-45.899899799, 48.190532346))
            Line((-45.899899799, 48.190532346), (-45.899899799, 65))
            ThreePointArc((-45.899899799, 65), (-45.314113362, 66.414213562), (-43.899899799, 67))
            Line((-43.899899799, 67), (-42.899899799, 67))
            Line((-42.899899799, 67), (-42.899899799, 79))
            ThreePointArc((-42.899899799, 79), (-42.314113362, 80.414213562), (-40.899899799, 81))
            Line((-40.899899799, 81), (-37.376275293, 81))
            Line((-37.376275293, 81), (-37.376275293, 85))
            Line((-37.376275293, 85), (-13.5, 85))
            ThreePointArc((-13.5, 85), (-11.442016978, 84.536439309), (-9.78153397, 83.235294118))
            ThreePointArc((-9.78153397, 83.235294118), (-9.089666049, 82.693150288), (-8.232173124, 82.5))
            Line((-8.232173124, 82.5), (-5, 82.5))
            Line((-5, 82.5), (-3.5, 82.5))
        make_face()
    extrude(amount=BOSS_EXTRUDE3_DEPTH)

    # Fillet3
    fillet3_edges = [part.edges().sort_by_distance(p)[0] for p in [
        (-46.899899799, 71, 17),
    ]]
    fillet(fillet3_edges, radius=FILLET3_R)


solid = part.part
